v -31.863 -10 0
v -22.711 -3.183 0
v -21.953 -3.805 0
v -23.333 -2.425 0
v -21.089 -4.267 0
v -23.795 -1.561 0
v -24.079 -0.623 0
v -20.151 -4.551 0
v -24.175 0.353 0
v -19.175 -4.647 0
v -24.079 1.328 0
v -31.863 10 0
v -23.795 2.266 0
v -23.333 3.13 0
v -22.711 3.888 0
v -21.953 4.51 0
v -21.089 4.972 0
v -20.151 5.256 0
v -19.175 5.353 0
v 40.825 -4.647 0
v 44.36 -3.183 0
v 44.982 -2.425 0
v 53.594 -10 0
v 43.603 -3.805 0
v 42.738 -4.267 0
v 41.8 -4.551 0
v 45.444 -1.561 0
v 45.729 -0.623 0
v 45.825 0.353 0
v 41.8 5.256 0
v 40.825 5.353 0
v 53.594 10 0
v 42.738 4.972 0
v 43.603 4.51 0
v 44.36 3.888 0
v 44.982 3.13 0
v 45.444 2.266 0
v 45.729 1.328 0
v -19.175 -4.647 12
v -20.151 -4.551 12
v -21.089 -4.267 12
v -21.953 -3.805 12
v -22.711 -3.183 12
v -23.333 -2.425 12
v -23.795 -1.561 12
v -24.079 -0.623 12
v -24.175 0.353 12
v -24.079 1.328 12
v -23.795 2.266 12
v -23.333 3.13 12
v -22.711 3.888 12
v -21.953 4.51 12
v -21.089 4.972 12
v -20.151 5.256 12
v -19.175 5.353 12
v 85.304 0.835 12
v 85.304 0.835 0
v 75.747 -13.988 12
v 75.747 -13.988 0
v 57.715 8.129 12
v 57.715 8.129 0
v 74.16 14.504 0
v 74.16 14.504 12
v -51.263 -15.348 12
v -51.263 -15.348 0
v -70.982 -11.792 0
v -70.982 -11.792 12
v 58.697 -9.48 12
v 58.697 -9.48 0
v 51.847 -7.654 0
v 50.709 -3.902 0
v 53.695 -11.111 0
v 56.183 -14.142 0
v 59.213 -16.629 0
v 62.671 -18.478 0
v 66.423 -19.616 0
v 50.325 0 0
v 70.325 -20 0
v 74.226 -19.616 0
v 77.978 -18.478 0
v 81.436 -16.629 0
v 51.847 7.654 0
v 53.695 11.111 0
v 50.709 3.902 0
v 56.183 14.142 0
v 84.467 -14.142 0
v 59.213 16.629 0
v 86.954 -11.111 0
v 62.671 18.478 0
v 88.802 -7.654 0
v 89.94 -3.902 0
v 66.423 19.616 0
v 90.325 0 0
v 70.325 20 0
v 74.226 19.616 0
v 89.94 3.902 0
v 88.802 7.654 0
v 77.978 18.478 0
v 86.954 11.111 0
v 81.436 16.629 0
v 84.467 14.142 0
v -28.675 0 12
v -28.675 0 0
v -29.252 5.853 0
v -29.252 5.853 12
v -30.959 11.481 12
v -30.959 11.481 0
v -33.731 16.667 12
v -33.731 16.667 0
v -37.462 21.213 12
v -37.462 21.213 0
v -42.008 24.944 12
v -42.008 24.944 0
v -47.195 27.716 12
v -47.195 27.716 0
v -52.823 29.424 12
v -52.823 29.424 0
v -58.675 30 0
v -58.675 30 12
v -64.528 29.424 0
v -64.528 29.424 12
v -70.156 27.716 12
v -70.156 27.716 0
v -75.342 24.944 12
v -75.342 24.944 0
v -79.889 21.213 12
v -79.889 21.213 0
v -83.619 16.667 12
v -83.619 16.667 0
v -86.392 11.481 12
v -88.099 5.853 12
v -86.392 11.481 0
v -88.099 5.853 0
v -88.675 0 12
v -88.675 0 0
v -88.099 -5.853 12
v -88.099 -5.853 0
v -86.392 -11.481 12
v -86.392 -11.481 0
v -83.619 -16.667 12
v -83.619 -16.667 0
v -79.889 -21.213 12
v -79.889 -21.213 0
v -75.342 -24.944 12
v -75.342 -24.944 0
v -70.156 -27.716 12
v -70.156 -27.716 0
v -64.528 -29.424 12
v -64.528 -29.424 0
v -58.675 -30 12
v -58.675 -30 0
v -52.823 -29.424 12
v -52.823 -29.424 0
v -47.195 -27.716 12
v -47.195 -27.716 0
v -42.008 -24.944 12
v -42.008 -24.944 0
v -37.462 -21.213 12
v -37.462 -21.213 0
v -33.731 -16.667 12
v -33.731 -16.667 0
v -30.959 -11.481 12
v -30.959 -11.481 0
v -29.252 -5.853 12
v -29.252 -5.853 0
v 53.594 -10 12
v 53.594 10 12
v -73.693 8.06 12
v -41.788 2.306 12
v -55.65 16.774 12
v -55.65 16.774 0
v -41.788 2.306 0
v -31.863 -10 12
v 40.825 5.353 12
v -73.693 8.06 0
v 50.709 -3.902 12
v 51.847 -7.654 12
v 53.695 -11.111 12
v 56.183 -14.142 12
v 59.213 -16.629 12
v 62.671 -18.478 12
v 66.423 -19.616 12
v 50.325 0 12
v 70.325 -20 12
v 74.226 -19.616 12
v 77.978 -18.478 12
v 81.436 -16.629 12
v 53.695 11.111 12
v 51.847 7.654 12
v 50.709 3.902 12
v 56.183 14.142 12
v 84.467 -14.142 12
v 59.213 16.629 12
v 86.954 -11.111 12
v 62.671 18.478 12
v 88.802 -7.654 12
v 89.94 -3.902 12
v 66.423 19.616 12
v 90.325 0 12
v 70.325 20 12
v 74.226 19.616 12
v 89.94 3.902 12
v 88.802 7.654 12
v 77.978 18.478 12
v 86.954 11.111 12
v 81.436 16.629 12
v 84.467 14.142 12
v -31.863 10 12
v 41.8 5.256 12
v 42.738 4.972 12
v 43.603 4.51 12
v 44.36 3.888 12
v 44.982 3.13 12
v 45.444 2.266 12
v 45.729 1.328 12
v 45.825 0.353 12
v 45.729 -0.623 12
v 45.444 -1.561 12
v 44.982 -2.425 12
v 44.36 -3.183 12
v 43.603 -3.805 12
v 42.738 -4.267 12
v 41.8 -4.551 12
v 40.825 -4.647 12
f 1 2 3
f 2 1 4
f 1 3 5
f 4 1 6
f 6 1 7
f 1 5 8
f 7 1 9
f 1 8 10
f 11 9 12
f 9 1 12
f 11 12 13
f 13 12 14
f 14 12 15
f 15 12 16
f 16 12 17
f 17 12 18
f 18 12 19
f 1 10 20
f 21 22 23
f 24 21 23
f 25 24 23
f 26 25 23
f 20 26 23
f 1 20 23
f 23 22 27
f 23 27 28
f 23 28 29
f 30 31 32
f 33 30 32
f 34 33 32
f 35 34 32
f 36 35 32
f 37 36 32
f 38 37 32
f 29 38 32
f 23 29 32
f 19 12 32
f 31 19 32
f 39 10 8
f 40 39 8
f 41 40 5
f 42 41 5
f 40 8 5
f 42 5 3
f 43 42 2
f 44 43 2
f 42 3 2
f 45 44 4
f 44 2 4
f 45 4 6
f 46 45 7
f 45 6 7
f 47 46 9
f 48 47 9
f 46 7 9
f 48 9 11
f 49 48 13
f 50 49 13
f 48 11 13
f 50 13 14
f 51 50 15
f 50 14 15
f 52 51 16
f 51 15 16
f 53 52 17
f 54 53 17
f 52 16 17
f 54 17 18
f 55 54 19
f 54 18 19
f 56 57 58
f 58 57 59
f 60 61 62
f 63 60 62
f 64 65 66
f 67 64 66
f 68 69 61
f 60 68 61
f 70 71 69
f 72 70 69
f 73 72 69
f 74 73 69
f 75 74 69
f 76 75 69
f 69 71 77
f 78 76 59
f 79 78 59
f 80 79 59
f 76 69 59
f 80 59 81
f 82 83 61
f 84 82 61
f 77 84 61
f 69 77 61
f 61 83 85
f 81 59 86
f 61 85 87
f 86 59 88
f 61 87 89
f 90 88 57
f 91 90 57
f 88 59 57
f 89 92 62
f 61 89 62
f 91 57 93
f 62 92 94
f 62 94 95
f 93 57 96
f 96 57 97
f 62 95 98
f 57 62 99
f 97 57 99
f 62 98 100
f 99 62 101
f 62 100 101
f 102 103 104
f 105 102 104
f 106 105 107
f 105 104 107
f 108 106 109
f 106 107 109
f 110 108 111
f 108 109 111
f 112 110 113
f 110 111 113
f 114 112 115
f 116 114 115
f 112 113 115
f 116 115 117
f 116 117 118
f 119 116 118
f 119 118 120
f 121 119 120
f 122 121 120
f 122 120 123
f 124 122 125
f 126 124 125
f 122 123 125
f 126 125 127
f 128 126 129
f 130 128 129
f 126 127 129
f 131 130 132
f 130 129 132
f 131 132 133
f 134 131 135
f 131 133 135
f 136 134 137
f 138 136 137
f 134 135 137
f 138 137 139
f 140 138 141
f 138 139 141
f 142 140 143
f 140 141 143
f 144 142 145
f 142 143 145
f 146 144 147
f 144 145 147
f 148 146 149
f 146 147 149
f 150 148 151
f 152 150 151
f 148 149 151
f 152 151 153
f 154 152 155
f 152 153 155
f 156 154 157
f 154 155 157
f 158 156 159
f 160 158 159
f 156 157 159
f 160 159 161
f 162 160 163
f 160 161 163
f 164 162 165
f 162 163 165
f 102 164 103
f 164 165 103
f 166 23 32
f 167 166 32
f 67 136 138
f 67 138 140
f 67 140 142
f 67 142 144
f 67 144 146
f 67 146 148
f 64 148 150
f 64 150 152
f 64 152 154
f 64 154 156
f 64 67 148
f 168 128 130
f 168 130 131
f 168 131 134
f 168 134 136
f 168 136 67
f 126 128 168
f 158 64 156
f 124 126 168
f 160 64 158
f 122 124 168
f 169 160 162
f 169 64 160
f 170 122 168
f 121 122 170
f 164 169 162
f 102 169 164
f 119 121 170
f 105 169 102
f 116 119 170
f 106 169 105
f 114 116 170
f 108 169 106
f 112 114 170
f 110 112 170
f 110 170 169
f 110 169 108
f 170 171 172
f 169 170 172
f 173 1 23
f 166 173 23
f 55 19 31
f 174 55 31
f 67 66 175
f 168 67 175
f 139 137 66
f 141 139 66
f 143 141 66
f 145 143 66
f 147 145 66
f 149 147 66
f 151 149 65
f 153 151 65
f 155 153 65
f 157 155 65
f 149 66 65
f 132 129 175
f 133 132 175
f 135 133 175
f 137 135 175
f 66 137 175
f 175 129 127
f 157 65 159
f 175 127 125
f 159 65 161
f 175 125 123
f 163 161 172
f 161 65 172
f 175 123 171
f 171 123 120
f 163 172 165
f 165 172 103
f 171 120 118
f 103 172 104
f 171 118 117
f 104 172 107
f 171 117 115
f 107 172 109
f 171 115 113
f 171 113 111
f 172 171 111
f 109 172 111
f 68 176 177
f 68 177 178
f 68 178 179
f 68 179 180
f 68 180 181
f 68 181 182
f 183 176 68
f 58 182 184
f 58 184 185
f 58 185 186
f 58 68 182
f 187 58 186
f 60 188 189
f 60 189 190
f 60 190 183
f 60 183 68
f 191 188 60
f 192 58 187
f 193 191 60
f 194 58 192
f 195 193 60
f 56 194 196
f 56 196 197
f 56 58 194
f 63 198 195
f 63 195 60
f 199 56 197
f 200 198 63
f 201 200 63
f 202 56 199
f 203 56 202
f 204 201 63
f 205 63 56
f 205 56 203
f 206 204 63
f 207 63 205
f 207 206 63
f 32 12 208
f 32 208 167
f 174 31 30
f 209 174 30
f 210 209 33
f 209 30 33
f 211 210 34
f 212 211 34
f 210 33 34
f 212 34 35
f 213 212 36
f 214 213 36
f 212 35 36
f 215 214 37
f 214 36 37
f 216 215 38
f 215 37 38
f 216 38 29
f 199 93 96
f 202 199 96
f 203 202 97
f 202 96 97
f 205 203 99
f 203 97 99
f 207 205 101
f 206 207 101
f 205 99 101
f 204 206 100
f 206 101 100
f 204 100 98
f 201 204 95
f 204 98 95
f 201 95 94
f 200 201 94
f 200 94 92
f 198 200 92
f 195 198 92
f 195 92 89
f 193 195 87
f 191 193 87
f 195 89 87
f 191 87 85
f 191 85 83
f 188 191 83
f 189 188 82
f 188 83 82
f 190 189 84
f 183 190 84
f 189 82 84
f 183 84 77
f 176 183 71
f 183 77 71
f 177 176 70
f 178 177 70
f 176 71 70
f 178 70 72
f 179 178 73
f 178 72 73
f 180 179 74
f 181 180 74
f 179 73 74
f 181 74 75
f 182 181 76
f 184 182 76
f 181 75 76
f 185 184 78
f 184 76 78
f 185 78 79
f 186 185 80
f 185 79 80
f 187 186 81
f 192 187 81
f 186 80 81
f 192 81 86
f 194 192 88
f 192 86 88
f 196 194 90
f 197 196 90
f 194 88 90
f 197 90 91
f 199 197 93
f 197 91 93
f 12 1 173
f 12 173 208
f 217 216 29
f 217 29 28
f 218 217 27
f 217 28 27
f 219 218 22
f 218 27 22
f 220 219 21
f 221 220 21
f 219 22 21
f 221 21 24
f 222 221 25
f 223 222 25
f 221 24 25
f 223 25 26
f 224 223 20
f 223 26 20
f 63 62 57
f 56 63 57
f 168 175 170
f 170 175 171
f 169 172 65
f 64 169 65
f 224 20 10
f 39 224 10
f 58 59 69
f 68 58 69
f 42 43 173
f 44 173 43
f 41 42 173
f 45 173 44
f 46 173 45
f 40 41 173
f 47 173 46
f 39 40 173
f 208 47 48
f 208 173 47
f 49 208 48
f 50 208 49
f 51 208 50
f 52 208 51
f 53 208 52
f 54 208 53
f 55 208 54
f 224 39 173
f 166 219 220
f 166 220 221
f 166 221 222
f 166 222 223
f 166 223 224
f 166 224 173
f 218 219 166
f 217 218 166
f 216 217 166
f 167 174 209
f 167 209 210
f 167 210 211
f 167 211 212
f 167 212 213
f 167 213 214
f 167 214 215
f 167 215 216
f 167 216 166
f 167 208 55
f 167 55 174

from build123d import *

# Parameters (mm, degrees)
F0_R     = 30
F3_DEPTH = 12
F2_W     = 85.4578563434
F2_H     = 20
F1_R     = 20


with BuildPart() as f3:
    # F0 (on Top) → F3 (new body)
    with BuildSketch(Plane.XY):
        with Locations((-58.6753451633, 0)):
            Circle(F0_R)
        Polygon((-73.6932197748, 8.0602907078), (-55.6503316367, 16.7736143185), (-41.7879093759, 2.3063730552), (-51.2633493904, -15.3481973796), (-70.9819156385, -11.7920807019), align=None, mode=Mode.SUBTRACT)
    extrude(amount=F3_DEPTH)


with BuildPart() as f3b:
    # F2 (on Top) → F3, piece 2 (new body)
    with BuildSketch(Plane.XY):
        with Locations((10.8655309305, 0)):
            Rectangle(F2_W, F2_H)
        with BuildLine():
            ThreePointArc((-19.1753451633, -4.6474677511), (-24.1753451633, 0.3525322489), (-19.1753451633, 5.3525322489))
            Line((-19.1753451633, 5.3525322489), (40.8246548367, 5.3525322489))
            ThreePointArc((40.8246548367, 5.3525322489), (44.3601887427, 3.8880661549), (45.8246548367, 0.3525322489))
            ThreePointArc((45.8246548367, 0.3525322489), (44.3601887427, -3.183001657), (40.8246548367, -4.6474677511))
            Line((40.8246548367, -4.6474677511), (-19.1753451633, -4.6474677511))
        make_face(mode=Mode.SUBTRACT)
    extrude(amount=F3_DEPTH)


with BuildPart() as f3c:
    # F1 (on Top) → F3, piece 3 (new body)
    with BuildSketch(Plane.XY):
        with Locations((70.3246548367, 0)):
            Circle(F1_R)
        Polygon((57.7153999166, 8.1292919608), (74.1595968722, 14.5042034255), (85.3040342797, 0.8347987359), (75.7474784274, -13.988269433), (58.6967646878, -9.4800246893), align=None, mode=Mode.SUBTRACT)
    extrude(amount=F3_DEPTH)


solid = Compound([f3.part, f3b.part, f3c.part])
